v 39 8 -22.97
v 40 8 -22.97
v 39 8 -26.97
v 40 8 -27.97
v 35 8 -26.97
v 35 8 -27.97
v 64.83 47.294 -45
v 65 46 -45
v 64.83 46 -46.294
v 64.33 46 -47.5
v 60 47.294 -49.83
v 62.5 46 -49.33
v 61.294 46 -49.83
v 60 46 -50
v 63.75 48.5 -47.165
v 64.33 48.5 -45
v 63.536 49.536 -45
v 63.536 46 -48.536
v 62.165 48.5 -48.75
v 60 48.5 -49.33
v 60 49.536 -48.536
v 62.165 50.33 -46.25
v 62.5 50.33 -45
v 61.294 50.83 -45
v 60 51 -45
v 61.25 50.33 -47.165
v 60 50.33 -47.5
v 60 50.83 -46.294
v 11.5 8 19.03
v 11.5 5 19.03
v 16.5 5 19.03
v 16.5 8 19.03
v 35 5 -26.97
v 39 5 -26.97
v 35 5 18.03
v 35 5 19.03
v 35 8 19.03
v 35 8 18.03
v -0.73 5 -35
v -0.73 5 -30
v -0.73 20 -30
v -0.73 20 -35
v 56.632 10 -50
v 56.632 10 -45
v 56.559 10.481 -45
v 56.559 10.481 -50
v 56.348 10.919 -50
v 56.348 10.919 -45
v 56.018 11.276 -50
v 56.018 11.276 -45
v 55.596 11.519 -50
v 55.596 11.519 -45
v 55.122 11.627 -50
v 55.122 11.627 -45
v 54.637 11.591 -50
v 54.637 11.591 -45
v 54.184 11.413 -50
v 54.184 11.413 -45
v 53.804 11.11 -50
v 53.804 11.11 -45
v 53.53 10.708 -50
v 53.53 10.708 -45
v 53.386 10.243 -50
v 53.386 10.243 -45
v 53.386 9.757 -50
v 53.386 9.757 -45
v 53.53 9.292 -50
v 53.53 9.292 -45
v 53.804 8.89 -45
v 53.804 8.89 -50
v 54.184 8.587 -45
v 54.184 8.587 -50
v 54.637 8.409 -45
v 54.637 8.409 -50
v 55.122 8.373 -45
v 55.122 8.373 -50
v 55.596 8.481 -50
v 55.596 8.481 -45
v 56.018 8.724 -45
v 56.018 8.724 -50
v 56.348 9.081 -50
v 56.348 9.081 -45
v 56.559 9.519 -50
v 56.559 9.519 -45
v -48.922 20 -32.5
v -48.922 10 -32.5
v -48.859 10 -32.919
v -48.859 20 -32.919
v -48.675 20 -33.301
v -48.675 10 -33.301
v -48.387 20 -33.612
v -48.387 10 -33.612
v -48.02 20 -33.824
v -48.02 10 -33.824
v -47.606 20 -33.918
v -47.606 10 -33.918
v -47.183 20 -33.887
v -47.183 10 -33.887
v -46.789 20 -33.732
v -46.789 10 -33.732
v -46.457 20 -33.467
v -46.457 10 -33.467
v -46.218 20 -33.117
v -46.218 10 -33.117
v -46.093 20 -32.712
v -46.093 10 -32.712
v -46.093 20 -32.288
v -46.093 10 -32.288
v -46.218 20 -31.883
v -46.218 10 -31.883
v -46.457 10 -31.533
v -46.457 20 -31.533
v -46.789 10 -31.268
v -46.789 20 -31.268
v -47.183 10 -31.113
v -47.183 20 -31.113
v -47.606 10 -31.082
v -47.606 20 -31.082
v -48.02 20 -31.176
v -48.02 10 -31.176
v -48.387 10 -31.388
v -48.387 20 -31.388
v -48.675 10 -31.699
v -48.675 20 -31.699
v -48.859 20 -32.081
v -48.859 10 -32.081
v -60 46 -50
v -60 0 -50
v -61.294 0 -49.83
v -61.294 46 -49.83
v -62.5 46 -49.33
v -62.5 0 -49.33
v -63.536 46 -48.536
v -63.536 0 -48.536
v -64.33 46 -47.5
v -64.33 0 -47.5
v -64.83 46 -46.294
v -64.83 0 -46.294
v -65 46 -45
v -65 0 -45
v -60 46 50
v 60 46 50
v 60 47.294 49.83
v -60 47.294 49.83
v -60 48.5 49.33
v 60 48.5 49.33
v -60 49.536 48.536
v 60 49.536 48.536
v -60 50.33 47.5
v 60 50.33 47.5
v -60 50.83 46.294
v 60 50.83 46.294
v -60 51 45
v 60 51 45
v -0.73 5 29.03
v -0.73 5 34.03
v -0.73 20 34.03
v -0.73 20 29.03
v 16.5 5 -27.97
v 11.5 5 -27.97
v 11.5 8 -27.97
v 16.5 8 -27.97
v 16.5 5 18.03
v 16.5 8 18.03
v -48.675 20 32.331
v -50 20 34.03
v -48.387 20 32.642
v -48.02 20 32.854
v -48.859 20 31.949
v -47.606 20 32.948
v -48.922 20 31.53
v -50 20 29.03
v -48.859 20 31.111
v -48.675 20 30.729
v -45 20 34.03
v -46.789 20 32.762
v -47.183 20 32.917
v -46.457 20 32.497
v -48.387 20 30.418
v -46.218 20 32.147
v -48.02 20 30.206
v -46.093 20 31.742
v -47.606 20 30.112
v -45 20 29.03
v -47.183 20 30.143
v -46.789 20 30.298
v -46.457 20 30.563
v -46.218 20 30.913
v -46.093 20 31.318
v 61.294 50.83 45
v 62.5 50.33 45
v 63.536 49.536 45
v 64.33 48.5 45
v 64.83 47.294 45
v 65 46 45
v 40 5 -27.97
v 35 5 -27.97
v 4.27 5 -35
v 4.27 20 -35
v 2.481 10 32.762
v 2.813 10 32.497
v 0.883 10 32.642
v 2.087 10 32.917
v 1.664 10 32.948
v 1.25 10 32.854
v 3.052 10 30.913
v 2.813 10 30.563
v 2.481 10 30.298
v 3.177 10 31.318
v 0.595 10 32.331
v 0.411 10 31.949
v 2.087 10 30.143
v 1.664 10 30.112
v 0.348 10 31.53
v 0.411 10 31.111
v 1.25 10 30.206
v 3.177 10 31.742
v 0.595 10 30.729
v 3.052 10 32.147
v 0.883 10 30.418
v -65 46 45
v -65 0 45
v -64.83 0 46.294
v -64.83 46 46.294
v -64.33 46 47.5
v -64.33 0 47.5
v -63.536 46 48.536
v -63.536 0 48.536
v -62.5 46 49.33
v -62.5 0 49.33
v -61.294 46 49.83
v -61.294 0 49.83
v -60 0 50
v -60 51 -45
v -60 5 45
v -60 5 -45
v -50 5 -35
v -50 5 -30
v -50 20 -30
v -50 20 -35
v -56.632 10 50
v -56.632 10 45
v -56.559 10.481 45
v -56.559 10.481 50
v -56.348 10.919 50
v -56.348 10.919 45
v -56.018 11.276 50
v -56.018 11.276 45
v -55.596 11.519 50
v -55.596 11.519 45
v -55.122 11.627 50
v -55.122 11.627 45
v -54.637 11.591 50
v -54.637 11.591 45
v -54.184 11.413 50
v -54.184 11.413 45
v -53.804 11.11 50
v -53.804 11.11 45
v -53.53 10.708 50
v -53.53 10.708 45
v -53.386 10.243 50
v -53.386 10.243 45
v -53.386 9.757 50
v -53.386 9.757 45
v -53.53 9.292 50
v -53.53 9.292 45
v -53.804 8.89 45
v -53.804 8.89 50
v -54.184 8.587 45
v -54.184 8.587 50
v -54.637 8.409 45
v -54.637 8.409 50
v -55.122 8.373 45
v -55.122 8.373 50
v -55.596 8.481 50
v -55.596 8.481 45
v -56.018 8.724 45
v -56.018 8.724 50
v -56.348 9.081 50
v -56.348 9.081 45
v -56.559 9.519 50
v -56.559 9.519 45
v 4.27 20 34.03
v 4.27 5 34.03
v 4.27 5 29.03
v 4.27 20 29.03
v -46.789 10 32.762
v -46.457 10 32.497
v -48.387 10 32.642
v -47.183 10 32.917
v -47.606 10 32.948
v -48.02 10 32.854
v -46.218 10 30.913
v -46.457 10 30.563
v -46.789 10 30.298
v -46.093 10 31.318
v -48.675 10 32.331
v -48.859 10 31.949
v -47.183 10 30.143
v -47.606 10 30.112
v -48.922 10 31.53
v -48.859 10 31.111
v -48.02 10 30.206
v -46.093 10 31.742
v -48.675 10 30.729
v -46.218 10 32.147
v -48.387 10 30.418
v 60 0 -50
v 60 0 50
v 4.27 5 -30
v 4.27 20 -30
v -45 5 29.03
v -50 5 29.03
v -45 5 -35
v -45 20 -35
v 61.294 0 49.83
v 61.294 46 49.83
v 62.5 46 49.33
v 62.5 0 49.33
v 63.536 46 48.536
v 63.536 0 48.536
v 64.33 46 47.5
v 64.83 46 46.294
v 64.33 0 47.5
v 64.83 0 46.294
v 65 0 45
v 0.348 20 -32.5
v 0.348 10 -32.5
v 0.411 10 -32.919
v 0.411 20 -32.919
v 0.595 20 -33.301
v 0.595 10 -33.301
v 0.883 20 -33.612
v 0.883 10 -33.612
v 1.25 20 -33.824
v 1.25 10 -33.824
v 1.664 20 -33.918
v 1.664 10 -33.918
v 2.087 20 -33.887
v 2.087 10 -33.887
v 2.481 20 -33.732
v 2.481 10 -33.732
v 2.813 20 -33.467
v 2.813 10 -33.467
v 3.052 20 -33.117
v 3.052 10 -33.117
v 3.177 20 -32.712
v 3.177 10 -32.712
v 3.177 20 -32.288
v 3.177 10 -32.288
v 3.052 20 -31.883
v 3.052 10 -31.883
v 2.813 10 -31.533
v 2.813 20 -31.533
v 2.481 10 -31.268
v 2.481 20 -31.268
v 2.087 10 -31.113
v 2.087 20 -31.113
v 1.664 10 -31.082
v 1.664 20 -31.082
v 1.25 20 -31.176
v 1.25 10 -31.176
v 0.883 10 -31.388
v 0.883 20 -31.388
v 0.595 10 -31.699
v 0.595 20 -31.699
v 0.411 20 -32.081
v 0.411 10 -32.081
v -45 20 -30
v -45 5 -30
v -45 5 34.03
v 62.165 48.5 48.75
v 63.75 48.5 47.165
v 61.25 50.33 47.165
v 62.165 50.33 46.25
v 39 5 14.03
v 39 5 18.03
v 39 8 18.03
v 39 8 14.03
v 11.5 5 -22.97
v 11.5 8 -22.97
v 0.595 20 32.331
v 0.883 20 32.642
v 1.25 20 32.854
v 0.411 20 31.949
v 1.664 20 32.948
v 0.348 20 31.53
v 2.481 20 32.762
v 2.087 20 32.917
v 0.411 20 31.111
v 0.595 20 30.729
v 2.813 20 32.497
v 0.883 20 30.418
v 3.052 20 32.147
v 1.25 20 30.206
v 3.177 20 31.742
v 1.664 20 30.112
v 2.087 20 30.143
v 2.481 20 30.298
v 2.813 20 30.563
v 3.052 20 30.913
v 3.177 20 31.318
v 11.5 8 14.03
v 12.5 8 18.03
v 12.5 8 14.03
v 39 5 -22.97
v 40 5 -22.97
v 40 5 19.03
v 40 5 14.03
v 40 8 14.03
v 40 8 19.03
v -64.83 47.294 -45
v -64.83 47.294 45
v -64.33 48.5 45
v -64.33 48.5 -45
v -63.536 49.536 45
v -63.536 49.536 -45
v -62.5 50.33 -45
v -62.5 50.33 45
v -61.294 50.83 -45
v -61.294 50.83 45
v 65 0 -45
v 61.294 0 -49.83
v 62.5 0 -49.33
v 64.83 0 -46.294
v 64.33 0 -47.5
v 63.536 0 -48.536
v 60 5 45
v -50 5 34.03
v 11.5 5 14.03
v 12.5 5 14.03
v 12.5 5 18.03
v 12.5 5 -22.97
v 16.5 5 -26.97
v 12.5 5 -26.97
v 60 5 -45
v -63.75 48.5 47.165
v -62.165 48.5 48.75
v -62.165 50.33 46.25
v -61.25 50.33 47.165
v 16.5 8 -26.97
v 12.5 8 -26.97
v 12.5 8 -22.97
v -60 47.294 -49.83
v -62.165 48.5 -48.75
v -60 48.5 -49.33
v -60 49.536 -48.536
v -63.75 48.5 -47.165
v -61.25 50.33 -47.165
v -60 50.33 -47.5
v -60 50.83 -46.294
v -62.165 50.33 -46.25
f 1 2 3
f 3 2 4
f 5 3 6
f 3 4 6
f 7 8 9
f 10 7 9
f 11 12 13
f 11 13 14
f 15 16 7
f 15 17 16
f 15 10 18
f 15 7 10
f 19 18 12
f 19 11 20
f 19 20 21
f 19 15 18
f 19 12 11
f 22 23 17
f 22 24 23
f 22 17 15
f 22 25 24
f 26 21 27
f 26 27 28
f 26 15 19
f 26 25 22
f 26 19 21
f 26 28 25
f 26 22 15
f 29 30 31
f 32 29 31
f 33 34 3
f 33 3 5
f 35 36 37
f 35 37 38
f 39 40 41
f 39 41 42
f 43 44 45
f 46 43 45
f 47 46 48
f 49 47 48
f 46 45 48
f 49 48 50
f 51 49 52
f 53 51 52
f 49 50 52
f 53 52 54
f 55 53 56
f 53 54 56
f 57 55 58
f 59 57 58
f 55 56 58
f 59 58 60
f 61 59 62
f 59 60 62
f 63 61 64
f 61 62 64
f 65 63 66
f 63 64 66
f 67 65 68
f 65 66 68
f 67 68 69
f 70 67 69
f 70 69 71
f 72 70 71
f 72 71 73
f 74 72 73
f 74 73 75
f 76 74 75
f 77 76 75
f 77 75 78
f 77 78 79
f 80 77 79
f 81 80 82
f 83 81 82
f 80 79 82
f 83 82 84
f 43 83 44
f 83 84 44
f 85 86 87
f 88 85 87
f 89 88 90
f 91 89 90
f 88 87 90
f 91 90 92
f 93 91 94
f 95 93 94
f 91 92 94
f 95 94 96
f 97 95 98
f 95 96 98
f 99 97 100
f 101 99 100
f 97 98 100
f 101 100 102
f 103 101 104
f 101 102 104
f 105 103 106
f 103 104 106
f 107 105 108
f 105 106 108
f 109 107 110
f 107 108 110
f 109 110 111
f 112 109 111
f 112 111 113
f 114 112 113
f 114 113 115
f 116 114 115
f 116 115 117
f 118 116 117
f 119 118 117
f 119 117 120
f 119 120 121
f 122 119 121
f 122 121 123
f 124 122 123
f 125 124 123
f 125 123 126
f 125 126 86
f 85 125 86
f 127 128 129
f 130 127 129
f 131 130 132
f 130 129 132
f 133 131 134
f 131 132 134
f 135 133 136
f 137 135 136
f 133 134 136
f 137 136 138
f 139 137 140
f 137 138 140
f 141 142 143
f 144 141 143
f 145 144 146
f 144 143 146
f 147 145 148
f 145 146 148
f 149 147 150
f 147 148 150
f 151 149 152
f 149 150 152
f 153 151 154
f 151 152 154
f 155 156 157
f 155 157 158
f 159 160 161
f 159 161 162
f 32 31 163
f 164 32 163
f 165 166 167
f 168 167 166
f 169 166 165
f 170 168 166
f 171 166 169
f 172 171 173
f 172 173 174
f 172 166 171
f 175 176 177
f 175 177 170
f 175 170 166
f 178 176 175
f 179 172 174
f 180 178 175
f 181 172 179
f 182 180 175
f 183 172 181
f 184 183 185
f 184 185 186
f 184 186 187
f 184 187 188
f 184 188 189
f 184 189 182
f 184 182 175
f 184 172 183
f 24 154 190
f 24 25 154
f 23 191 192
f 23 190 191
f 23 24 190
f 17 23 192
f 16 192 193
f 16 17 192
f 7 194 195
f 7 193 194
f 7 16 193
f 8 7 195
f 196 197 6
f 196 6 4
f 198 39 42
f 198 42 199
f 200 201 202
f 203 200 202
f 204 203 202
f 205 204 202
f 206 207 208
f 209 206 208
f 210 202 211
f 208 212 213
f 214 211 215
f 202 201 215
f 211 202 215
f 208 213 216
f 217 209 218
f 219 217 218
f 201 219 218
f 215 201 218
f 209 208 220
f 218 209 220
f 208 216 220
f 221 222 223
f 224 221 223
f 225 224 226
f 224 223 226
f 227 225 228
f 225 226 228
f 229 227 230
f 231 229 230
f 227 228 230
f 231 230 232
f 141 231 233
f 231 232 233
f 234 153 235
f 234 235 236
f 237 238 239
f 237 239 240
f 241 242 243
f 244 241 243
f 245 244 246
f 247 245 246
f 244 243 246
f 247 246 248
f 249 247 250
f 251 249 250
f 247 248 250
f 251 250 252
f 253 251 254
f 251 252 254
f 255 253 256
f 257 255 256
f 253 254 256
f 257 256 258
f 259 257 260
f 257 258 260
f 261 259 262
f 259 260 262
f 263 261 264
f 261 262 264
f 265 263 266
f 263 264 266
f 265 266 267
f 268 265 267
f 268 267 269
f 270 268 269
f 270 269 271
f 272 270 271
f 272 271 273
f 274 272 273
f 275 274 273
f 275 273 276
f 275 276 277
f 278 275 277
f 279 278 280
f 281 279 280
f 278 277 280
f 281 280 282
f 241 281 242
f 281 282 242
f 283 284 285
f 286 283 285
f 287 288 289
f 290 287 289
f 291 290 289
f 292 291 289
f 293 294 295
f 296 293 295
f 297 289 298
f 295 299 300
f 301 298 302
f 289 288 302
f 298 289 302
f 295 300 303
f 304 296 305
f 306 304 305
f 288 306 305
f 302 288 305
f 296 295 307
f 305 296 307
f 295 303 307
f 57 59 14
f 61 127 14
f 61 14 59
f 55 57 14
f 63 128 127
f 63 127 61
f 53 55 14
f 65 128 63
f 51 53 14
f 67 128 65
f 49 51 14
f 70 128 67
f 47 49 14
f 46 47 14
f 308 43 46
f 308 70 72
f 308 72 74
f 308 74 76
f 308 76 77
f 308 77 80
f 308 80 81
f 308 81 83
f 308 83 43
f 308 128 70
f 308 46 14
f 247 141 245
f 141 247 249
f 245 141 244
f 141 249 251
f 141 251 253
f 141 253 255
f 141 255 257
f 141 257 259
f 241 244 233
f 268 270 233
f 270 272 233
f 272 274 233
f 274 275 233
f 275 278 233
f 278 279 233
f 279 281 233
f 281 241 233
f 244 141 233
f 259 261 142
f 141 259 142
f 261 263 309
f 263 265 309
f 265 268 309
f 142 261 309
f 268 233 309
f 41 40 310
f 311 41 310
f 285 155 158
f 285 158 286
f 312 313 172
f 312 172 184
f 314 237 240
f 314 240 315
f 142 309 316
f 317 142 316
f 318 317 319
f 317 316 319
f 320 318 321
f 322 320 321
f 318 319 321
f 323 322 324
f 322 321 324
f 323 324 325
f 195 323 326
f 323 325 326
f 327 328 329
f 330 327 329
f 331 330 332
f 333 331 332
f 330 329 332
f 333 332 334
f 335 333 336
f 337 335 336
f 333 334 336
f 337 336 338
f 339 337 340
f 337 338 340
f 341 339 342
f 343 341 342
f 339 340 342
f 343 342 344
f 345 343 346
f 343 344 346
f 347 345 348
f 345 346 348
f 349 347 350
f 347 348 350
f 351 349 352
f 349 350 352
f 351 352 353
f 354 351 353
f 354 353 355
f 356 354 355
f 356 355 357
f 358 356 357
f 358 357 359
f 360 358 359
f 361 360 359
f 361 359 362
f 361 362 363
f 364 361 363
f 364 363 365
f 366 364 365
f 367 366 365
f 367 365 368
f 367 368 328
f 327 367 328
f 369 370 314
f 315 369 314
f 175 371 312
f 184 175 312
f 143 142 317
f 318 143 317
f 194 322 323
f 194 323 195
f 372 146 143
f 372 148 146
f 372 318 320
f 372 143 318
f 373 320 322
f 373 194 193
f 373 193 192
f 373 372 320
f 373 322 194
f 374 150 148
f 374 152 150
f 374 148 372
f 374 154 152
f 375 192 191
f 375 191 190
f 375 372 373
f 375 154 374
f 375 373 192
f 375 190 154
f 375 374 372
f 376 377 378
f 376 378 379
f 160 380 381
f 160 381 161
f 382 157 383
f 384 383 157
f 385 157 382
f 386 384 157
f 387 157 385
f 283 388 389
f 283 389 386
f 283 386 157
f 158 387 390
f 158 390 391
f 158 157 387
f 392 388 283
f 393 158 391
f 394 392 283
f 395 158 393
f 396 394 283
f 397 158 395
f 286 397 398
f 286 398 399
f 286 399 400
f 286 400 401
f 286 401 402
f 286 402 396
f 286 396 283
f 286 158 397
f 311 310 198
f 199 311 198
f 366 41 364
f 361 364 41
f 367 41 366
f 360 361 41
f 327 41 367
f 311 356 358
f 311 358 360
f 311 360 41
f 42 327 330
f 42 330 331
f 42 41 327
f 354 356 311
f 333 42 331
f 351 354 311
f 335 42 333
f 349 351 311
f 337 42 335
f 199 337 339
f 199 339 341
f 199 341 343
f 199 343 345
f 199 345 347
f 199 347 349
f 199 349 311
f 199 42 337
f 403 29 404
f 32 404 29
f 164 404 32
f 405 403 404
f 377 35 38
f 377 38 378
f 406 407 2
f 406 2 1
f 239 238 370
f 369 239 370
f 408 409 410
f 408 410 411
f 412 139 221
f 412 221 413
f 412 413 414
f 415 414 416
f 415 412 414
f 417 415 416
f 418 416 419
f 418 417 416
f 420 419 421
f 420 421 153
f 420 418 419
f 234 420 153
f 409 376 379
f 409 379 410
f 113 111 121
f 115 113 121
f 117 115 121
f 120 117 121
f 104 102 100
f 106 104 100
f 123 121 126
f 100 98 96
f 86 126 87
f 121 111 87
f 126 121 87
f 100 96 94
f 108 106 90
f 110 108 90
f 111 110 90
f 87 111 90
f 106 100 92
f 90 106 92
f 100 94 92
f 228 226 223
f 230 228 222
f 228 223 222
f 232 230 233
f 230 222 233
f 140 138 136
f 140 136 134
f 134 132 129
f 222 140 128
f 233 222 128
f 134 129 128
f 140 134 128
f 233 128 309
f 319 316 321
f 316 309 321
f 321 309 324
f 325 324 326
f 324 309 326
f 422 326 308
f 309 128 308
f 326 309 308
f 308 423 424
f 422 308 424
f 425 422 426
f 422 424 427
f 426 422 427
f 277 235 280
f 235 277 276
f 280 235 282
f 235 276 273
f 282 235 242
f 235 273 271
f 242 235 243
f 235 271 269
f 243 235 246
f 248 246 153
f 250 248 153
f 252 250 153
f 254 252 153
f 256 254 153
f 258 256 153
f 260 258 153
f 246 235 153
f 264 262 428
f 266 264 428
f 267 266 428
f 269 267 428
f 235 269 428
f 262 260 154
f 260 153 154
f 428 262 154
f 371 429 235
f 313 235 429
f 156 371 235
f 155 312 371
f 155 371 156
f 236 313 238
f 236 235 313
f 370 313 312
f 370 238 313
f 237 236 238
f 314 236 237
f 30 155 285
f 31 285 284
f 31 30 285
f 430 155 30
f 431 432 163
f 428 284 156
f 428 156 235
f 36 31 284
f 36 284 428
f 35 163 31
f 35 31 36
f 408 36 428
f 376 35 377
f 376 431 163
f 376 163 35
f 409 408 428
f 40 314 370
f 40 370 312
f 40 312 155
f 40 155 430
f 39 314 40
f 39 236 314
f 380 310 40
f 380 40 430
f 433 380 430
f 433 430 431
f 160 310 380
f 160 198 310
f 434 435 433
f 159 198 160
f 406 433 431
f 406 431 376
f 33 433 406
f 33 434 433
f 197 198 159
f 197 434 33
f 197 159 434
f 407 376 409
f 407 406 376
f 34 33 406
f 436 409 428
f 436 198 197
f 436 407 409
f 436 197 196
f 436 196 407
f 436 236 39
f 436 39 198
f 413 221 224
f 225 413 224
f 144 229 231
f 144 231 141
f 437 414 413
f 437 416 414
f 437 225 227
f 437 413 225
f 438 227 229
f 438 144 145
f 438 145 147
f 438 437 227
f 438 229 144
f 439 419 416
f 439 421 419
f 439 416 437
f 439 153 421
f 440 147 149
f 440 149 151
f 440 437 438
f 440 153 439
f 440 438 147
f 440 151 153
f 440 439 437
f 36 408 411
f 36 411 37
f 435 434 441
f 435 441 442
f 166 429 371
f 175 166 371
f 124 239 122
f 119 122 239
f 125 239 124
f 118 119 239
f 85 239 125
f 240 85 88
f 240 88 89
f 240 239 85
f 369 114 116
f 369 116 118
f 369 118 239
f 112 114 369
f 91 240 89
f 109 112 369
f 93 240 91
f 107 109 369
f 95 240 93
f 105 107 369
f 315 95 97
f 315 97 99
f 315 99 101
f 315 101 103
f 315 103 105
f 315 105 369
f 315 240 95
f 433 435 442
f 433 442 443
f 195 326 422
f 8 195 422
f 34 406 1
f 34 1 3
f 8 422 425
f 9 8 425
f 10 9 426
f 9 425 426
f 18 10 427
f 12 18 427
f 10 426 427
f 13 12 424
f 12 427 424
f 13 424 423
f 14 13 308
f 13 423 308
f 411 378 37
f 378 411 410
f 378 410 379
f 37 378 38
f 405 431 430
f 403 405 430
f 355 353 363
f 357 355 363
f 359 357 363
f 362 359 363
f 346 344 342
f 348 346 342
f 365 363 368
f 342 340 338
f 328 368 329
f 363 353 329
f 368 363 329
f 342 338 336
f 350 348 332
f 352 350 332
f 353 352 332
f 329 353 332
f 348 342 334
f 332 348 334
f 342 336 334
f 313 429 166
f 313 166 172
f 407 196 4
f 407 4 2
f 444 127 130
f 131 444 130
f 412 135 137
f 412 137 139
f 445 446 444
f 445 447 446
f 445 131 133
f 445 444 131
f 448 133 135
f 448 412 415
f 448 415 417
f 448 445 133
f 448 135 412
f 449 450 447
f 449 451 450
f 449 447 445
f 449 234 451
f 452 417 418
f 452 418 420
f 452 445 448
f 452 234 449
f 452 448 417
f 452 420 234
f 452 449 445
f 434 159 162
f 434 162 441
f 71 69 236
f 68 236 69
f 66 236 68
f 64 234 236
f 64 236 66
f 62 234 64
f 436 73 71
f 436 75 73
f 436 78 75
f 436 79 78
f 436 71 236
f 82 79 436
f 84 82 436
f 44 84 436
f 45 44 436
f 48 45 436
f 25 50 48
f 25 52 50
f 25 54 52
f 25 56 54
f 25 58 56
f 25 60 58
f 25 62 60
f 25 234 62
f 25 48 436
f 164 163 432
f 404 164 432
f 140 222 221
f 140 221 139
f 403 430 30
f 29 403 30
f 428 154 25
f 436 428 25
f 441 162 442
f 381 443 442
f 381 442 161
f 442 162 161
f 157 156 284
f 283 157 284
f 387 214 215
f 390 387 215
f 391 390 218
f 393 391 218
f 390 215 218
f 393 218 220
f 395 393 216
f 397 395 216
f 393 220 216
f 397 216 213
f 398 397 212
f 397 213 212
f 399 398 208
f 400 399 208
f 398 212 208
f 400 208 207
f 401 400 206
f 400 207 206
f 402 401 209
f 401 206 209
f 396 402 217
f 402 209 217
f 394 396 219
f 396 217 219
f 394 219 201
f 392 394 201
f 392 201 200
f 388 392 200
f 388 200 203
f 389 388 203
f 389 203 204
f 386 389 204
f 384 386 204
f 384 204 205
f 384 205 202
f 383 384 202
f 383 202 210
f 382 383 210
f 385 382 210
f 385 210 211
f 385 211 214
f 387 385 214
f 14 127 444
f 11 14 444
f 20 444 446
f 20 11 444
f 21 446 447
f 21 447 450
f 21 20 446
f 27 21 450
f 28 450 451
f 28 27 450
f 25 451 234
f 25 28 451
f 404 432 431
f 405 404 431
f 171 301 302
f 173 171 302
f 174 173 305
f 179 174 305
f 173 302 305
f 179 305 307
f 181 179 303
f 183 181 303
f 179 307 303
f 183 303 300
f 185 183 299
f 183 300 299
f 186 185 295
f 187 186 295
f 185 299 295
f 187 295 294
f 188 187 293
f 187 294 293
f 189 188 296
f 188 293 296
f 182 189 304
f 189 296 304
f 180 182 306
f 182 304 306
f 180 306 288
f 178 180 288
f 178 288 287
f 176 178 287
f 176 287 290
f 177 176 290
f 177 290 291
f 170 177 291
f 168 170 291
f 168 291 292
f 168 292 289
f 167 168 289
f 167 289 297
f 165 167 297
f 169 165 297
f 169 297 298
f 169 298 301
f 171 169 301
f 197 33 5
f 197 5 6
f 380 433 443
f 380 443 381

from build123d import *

# Parameters (mm, degrees)
SKETCH1_W                                         = 130
SKETCH1_H                                         = 100
BOSS_EXTRUDE1_DEPTH                               = 51
SKETCH2_W                                         = 120
SKETCH2_H                                         = 90
CUT_EXTRUDE1_DEPTH                                = 46
FILLET2_R                                         = 5
FILLET4_R                                         = 5
SKETCH6_W                                         = 5
SKETCH6_H                                         = 5
BOSS_EXTRUDE2_DEPTH                               = 15
BOSS_EXTRUDE3_DEPTH                               = 3
F_4_CLEARANCE_HOLE2_D                             = 2.8448
F_4_CLEARANCE_HOLE2_DEPTH                         = 10
CSK_FOR_4_FLAT_HEAD_MACHINE_SCREW_100_D           = 3.2639
CSK_FOR_4_FLAT_HEAD_MACHINE_SCREW_100_DEPTH       = 10
CSK_FOR_4_FLAT_HEAD_MACHINE_SCREW_100_CSINK_D     = 5.715
CSK_FOR_4_FLAT_HEAD_MACHINE_SCREW_100_CSINK_ANGLE = 100
CSK_FOR_4_FLAT_HEAD_MACHINE_SCREW_100_TIP         = 0.980574487
CSK_FOR_4_FLAT_HEAD_MACHINE_SCREW_2_D             = 3.2639
CSK_FOR_4_FLAT_HEAD_MACHINE_SCREW_2_DEPTH         = 10
CSK_FOR_4_FLAT_HEAD_MACHINE_SCREW_2_CSINK_D       = 5.715
CSK_FOR_4_FLAT_HEAD_MACHINE_SCREW_2_CSINK_ANGLE   = 100
CSK_FOR_4_FLAT_HEAD_MACHINE_SCREW_2_TIP           = 0.980574487


# Some blends are built 0.0001 mm under size
with BuildPart() as part:
    # Sketch1 → Boss-Extrude1 (new body)
    with BuildSketch(Plane(origin=(0, 0, 0), x_dir=(1, 0, 0), z_dir=(0, 1, 0))):
        Rectangle(SKETCH1_W, SKETCH1_H)
    extrude(amount=BOSS_EXTRUDE1_DEPTH)

    # Sketch2 → Cut-Extrude1 (cut)
    with BuildSketch(Plane(origin=(0, 51, 0), x_dir=(1, 0, 0), z_dir=(0, 1, 0))):
        Rectangle(SKETCH2_W, SKETCH2_H)
    extrude(amount=-CUT_EXTRUDE1_DEPTH, mode=Mode.SUBTRACT)

    # Fillet2
    fillet2_edges = [part.edges().sort_by_distance(p)[0] for p in [
        (-65, 51, 0),
        (0, 51, 50),
        (65, 51, 0),
        (0, 51, -50),
    ]]
    fillet(fillet2_edges, radius=FILLET2_R - 0.0001)  # a hair under: the kernel refuses the full size

    # Fillet4
    # the kernel refuses this fillet: 5 mm, written as the material it takes off along each edge
    with BuildSketch(Plane(origin=(60, 51, 45), x_dir=(0, 0, 1), z_dir=(-1, 0, 0))) as fillet4_piece_1:
        with BuildLine():
            CenterArc((0.0001, -4.9999), 4.9999, 0, 90)
            Line((5, -4.9999), (5, 0))
            Line((5, 0), (0.0001, 0))
        make_face()
    revolve(axis=Axis((60, 51, 45), (0, 1, 0)), revolution_arc=90, mode=Mode.SUBTRACT)
    with BuildSketch(Plane(origin=(-60, 51, 45), x_dir=(-1, 0, 0), z_dir=(0, 0, -1))) as fillet4_piece_2:
        with BuildLine():
            CenterArc((0.0001, -4.9999), 4.9999, 0, 90)
            Line((5, -4.9999), (5, 0))
            Line((5, 0), (0.0001, 0))
        make_face()
    revolve(axis=Axis((-60, 51, 45), (0, 1, 0)), revolution_arc=90, mode=Mode.SUBTRACT)
    with BuildSketch(Plane(origin=(60, 51, -45), x_dir=(1, 0, 0), z_dir=(0, 0, 1))) as fillet4_piece_3:
        with BuildLine():
            CenterArc((0.0001, -4.9999), 4.9999, 0, 90)
            Line((5, -4.9999), (5, 0))
            Line((5, 0), (0.0001, 0))
        make_face()
    revolve(axis=Axis((60, 51, -45), (0, 1, 0)), revolution_arc=90, mode=Mode.SUBTRACT)
    with BuildSketch(Plane(origin=(-60, 51, -45), x_dir=(0, 0, -1), z_dir=(1, 0, 0))) as fillet4_piece_4:
        with BuildLine():
            CenterArc((0.0001, -4.9999), 4.9999, 0, 90)
            Line((5, -4.9999), (5, 0))
            Line((5, 0), (0.0001, 0))
        make_face()
    revolve(axis=Axis((-60, 51, -45), (0, 1, 0)), revolution_arc=90, mode=Mode.SUBTRACT)
    with BuildSketch(Plane(origin=(-65, -12.5, -50), x_dir=(1, 0, 0), z_dir=(0, 1, 0)), Plane(origin=(-65, -12.5, 50), x_dir=(0, 0, -1), z_dir=(0, 1, 0))) as fillet4_piece_5:
        with BuildLine():
            CenterArc((FILLET4_R, -FILLET4_R), FILLET4_R, 90, 90)
            Line((0, -FILLET4_R), (0, 0))
            Line((0, 0), (FILLET4_R, 0))
        make_face()
    extrude(amount=63.5, mode=Mode.SUBTRACT)
    with BuildSketch(Plane(origin=(65, -12.5, -50), x_dir=(-1, 0, 0), z_dir=(0, 1, 0)), Plane(origin=(65, -12.5, 50), x_dir=(0, 0, -1), z_dir=(0, 1, 0))) as fillet4_piece_6:
        with BuildLine():
            CenterArc((FILLET4_R, FILLET4_R), FILLET4_R, 180, 90)
            Line((0, FILLET4_R), (0, 0))
            Line((0, 0), (FILLET4_R, 0))
        make_face()
    extrude(amount=63.5, mode=Mode.SUBTRACT)

    # Sketch6 → Boss-Extrude2 (add)
    with BuildSketch(Plane(origin=(0, 5, 0), x_dir=(1, 0, 0), z_dir=(0, 1, 0))):
        with Locations((-47.5, 32.5)):
            Rectangle(SKETCH6_W, SKETCH6_H)
        with Locations((-47.5, -31.53)):
            Rectangle(SKETCH6_W, SKETCH6_H)
        with Locations((1.77, 32.5)):
            Rectangle(SKETCH6_W, SKETCH6_H)
        with Locations((1.77, -31.53)):
            Rectangle(SKETCH6_W, SKETCH6_H)
    extrude(amount=BOSS_EXTRUDE2_DEPTH)

    # Sketch9 → Boss-Extrude3 (add)
    with BuildSketch(Plane(origin=(0, 5, 0), x_dir=(1, 0, 0), z_dir=(0, 1, 0))):
        Polygon((11.5, -14.03), (11.5, -19.03), (16.5, -19.03), (16.5, -18.03), (12.5, -18.03), (12.5, -14.03), align=None)
        Polygon((11.5, 27.97), (16.5, 27.97), (16.5, 26.97), (12.5, 26.97), (12.5, 22.97), (11.5, 22.97), align=None)
        Polygon((40, 27.97), (40, 22.97), (39, 22.97), (39, 26.97), (35, 26.97), (35, 27.97), align=None)
        Polygon((40, -19.03), (35, -19.03), (35, -18.03), (39, -18.03), (39, -14.03), (40, -14.03), align=None)
    extrude(amount=BOSS_EXTRUDE3_DEPTH)

    # #4 Clearance Hole2
    with Locations(Plane(origin=(58.965440854, 20, -19.145321972), x_dir=(1, 0, 0), z_dir=(0, 1, 0))):
        with Locations((-106.465440854, -50.675321972), (-57.195440854, -50.675321972), (-57.195440854, 13.354678028), (-106.465440854, 13.354678028)):
            Hole(F_4_CLEARANCE_HOLE2_D / 2, depth=F_4_CLEARANCE_HOLE2_DEPTH)

    # CSK for _4 Flat Head Machine Screw _100
    with Locations(Plane(origin=(58.965440854, 7.381222334, 55), x_dir=(1, 0, 0), z_dir=(0, 0, 1))):
        with Locations((-113.965440854, 2.618777666)):
            CounterSinkHole(CSK_FOR_4_FLAT_HEAD_MACHINE_SCREW_100_D / 2, CSK_FOR_4_FLAT_HEAD_MACHINE_SCREW_100_CSINK_D / 2, depth=CSK_FOR_4_FLAT_HEAD_MACHINE_SCREW_100_DEPTH, counter_sink_angle=CSK_FOR_4_FLAT_HEAD_MACHINE_SCREW_100_CSINK_ANGLE)
            with Locations((0, 0, -(CSK_FOR_4_FLAT_HEAD_MACHINE_SCREW_100_DEPTH + CSK_FOR_4_FLAT_HEAD_MACHINE_SCREW_100_TIP / 2))):  # 118° drill point
                Cone(0, CSK_FOR_4_FLAT_HEAD_MACHINE_SCREW_100_D / 2, CSK_FOR_4_FLAT_HEAD_MACHINE_SCREW_100_TIP, mode=Mode.SUBTRACT)

    # CSK for _4 Flat Head Machine Screw _ 2
    with Locations(Plane(origin=(58.965440854, 7.381222334, -55), x_dir=(-1, 0, 0), z_dir=(0, 0, -1))):
        with Locations((3.965440854, 2.618777666)):
            CounterSinkHole(CSK_FOR_4_FLAT_HEAD_MACHINE_SCREW_2_D / 2, CSK_FOR_4_FLAT_HEAD_MACHINE_SCREW_2_CSINK_D / 2, depth=CSK_FOR_4_FLAT_HEAD_MACHINE_SCREW_2_DEPTH, counter_sink_angle=CSK_FOR_4_FLAT_HEAD_MACHINE_SCREW_2_CSINK_ANGLE)
            with Locations((0, 0, -(CSK_FOR_4_FLAT_HEAD_MACHINE_SCREW_2_DEPTH + CSK_FOR_4_FLAT_HEAD_MACHINE_SCREW_2_TIP / 2))):  # 118° drill point
                Cone(0, CSK_FOR_4_FLAT_HEAD_MACHINE_SCREW_2_D / 2, CSK_FOR_4_FLAT_HEAD_MACHINE_SCREW_2_TIP, mode=Mode.SUBTRACT)


solid = part.part
